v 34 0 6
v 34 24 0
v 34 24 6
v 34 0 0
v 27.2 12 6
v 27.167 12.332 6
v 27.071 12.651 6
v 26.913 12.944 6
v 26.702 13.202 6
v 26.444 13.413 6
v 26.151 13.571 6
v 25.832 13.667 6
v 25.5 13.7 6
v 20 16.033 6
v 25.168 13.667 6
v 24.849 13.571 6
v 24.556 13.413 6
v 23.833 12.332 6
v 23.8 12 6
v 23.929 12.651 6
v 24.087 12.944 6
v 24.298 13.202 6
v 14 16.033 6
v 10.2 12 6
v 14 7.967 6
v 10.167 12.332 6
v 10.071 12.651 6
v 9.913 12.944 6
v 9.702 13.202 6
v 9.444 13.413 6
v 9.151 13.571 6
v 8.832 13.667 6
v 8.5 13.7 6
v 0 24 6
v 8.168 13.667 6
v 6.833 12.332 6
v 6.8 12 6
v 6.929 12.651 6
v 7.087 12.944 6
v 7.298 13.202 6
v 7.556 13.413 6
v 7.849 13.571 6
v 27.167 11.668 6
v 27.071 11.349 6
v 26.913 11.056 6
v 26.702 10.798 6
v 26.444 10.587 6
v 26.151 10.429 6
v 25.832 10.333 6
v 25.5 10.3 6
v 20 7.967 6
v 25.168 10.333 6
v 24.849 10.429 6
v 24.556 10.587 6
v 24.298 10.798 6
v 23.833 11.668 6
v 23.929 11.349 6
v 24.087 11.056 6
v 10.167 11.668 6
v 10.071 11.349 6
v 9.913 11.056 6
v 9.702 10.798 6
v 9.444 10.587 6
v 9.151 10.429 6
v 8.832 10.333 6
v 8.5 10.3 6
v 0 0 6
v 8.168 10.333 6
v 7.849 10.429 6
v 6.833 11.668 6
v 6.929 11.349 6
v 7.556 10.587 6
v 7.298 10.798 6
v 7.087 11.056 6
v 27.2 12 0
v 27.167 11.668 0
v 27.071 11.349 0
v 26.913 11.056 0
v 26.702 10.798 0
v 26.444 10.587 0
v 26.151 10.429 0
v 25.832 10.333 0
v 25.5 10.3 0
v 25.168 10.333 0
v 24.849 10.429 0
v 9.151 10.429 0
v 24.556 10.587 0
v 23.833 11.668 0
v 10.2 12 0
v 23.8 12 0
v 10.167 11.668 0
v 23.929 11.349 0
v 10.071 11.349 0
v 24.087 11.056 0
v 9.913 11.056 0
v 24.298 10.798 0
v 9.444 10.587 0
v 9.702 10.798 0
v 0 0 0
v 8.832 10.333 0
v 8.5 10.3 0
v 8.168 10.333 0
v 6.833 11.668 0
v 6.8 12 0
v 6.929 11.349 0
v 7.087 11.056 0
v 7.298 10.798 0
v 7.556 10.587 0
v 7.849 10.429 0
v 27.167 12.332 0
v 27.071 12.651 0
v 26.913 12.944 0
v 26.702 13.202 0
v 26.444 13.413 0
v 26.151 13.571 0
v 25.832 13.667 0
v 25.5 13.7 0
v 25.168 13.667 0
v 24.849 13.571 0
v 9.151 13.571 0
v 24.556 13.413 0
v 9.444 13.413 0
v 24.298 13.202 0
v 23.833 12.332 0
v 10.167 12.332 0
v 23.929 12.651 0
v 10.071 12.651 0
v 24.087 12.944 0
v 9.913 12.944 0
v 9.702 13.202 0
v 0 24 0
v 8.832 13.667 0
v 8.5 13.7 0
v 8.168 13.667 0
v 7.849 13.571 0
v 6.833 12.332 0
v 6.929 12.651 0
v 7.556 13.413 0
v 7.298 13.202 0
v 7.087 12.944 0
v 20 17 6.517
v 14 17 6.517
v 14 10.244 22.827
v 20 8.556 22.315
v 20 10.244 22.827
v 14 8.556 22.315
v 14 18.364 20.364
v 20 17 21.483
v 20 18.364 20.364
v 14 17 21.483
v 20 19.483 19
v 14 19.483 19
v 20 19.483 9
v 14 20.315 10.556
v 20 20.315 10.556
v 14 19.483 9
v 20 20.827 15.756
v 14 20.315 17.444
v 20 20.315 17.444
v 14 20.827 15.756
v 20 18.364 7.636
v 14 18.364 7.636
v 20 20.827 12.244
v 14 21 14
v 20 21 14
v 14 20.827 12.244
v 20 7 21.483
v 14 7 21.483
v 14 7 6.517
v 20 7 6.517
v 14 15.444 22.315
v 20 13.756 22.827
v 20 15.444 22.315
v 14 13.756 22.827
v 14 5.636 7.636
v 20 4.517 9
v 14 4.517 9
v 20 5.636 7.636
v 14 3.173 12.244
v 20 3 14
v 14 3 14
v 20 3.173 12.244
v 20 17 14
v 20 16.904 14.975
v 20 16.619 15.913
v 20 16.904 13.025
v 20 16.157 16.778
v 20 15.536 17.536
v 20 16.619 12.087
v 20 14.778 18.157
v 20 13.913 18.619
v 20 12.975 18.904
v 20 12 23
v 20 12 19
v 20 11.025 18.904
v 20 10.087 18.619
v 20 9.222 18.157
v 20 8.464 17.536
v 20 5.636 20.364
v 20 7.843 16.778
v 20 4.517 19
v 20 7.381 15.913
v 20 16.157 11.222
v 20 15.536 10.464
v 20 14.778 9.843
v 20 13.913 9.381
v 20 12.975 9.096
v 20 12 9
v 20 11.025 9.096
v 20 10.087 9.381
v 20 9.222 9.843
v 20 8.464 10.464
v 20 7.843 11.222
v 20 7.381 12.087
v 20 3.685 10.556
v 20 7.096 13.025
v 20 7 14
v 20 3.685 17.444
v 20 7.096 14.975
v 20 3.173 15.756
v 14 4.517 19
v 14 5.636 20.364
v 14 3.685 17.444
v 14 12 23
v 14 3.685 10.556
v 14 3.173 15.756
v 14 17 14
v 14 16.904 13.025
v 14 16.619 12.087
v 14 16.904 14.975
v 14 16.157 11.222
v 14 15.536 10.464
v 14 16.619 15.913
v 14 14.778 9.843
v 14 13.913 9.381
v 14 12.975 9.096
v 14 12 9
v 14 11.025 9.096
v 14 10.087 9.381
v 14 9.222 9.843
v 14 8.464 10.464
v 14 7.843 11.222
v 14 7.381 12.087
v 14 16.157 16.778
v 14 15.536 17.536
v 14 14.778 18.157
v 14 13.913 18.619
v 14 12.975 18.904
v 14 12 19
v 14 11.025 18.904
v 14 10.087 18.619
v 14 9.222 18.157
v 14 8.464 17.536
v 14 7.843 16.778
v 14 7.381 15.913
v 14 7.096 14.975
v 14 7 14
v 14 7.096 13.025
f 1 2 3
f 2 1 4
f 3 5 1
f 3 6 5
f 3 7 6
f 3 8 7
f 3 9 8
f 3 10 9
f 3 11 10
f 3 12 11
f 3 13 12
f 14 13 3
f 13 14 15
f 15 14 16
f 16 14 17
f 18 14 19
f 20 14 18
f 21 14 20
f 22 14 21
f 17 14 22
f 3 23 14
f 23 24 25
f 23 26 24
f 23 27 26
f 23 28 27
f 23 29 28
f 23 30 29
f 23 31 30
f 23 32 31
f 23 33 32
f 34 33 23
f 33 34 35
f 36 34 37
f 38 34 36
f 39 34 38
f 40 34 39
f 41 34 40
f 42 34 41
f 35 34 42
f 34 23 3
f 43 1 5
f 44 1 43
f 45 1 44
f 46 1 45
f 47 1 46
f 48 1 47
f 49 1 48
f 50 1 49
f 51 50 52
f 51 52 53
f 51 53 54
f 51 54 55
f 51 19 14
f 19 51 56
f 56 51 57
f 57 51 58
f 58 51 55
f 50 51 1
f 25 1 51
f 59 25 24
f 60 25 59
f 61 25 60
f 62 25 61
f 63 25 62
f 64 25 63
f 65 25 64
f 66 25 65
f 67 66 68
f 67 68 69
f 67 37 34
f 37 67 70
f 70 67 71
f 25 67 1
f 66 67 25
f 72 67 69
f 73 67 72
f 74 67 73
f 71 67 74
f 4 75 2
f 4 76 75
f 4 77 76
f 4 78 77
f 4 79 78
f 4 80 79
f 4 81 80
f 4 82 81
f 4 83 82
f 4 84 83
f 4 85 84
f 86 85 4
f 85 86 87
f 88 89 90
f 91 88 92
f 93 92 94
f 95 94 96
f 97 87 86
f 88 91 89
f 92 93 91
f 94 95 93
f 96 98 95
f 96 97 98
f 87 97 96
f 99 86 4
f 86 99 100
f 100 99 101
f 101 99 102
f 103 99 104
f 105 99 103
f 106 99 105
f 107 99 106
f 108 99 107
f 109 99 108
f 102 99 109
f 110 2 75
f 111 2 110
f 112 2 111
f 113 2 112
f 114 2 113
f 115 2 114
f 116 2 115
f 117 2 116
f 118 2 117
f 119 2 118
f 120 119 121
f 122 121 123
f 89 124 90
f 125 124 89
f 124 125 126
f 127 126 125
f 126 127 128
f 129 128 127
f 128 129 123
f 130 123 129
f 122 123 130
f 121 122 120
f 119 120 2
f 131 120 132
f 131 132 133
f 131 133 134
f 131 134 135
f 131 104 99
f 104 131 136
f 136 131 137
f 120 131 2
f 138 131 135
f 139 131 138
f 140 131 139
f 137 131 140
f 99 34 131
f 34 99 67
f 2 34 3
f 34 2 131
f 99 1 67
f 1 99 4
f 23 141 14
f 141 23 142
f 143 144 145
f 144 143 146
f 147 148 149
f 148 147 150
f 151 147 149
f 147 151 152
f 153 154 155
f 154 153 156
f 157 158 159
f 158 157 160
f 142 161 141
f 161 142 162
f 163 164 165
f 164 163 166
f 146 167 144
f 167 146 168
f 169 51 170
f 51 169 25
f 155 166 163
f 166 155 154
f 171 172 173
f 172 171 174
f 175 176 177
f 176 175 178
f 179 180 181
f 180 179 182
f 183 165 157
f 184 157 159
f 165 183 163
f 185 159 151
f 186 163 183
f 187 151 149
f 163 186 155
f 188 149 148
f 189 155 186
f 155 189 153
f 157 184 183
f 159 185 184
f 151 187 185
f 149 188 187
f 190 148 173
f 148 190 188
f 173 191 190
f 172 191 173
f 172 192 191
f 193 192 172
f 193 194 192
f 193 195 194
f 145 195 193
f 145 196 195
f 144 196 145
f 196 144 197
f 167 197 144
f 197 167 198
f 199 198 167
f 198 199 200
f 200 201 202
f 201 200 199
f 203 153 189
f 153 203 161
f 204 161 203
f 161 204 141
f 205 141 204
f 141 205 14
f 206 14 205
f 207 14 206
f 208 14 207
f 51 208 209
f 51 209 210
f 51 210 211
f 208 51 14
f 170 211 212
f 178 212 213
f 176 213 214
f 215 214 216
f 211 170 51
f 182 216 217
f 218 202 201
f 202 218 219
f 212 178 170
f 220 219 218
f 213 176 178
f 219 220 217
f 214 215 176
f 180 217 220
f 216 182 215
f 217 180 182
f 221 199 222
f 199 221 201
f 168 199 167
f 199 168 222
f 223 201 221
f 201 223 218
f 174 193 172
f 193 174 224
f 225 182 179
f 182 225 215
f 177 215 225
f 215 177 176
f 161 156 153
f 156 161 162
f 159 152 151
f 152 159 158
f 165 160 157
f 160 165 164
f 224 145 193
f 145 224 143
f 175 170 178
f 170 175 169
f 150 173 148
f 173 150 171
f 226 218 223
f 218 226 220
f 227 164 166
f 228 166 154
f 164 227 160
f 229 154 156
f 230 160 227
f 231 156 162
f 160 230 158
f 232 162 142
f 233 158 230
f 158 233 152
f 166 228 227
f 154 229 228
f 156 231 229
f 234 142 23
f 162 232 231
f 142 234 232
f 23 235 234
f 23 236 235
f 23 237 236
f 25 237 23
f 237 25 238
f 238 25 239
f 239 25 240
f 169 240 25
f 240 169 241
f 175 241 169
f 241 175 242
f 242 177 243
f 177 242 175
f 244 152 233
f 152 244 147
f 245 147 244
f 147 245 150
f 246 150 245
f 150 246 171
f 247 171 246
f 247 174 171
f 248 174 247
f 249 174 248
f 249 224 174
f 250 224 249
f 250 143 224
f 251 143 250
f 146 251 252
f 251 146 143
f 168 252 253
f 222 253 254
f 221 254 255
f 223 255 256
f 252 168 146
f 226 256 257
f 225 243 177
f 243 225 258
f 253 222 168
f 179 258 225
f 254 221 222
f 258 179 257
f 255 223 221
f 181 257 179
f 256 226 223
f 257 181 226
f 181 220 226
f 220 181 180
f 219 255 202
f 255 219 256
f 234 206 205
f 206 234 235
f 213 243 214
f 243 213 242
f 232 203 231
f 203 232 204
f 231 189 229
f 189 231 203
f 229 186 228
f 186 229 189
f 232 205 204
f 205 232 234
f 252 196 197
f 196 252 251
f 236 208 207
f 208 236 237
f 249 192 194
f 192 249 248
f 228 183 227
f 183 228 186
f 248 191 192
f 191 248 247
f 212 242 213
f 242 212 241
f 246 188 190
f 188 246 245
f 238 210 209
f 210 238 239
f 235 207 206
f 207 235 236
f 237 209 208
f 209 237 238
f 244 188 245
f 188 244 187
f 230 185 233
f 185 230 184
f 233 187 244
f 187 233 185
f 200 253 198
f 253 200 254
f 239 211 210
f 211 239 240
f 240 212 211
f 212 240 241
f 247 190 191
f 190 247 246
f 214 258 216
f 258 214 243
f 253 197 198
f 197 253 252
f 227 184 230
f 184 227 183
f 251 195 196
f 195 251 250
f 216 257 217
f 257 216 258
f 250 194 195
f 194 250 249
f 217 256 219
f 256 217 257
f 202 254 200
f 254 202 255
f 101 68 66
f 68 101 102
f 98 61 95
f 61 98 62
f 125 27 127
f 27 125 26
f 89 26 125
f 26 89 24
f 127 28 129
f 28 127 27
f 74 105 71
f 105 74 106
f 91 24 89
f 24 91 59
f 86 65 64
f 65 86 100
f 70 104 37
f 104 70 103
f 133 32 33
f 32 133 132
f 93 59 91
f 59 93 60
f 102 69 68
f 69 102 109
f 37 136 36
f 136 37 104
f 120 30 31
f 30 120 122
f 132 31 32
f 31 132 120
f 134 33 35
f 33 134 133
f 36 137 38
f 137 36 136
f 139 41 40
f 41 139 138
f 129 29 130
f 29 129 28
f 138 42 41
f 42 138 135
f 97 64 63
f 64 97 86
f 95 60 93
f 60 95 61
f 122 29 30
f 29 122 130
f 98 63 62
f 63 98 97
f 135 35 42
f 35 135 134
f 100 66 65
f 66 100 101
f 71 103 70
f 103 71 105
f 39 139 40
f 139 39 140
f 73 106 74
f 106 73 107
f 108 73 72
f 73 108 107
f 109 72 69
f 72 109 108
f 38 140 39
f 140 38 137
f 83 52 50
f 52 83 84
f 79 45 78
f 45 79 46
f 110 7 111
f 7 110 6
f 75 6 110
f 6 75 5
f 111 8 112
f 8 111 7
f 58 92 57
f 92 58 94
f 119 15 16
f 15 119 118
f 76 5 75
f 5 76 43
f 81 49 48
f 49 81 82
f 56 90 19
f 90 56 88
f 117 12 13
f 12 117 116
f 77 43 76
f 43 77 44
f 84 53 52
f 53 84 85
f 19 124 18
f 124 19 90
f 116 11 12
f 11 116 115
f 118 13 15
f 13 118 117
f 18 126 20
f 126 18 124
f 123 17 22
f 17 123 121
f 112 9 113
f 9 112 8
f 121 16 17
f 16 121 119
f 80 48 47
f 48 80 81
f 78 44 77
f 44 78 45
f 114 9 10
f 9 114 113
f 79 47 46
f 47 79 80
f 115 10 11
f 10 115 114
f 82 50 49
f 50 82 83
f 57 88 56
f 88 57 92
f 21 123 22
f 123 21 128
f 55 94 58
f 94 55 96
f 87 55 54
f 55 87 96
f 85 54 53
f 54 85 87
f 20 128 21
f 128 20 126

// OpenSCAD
$fn = 32;

// ----------------------------------------------------------------------
// Cable clip: cable 10 mm, clamp 18 mm, base 34 mm
// ----------------------------------------------------------------------

// --- parameters (mm) ---
base_w = 34;              // base length, X
base_d = 24;              // base width, Y
base_t = 6;               // base thickness
clamp_d = 18;             // clamp outside diameter
wall_t = 4;               // clamp wall
cable_d = 10;             // cable opening
ring_w = 6;               // clamp width along the cable
screw_d = 3.4;            // screw clearance
sink = 1;                 // overlap of the clamp into the base

module base() {
  cube([base_w, base_d, base_t]);
}

module clamp() {
  translate([base_w / 2, base_d / 2, base_t + clamp_d / 2 - sink]) rotate([0, 90, 0])
    cylinder(h = ring_w, d = clamp_d, center = true);
}

difference() {
  union() {
    base();
    clamp();
  }
  translate([base_w / 2, base_d / 2, base_t + clamp_d / 2 - sink]) rotate([0, 90, 0]) translate([0, 0, -ring_w / 2 - 1]) cylinder(h = ring_w + 2, d = cable_d);
  translate([8.5, base_d / 2, -1]) cylinder(h = base_t + 2, d = screw_d);
  translate([25.5, base_d / 2, -1]) cylinder(h = base_t + 2, d = screw_d);
}
